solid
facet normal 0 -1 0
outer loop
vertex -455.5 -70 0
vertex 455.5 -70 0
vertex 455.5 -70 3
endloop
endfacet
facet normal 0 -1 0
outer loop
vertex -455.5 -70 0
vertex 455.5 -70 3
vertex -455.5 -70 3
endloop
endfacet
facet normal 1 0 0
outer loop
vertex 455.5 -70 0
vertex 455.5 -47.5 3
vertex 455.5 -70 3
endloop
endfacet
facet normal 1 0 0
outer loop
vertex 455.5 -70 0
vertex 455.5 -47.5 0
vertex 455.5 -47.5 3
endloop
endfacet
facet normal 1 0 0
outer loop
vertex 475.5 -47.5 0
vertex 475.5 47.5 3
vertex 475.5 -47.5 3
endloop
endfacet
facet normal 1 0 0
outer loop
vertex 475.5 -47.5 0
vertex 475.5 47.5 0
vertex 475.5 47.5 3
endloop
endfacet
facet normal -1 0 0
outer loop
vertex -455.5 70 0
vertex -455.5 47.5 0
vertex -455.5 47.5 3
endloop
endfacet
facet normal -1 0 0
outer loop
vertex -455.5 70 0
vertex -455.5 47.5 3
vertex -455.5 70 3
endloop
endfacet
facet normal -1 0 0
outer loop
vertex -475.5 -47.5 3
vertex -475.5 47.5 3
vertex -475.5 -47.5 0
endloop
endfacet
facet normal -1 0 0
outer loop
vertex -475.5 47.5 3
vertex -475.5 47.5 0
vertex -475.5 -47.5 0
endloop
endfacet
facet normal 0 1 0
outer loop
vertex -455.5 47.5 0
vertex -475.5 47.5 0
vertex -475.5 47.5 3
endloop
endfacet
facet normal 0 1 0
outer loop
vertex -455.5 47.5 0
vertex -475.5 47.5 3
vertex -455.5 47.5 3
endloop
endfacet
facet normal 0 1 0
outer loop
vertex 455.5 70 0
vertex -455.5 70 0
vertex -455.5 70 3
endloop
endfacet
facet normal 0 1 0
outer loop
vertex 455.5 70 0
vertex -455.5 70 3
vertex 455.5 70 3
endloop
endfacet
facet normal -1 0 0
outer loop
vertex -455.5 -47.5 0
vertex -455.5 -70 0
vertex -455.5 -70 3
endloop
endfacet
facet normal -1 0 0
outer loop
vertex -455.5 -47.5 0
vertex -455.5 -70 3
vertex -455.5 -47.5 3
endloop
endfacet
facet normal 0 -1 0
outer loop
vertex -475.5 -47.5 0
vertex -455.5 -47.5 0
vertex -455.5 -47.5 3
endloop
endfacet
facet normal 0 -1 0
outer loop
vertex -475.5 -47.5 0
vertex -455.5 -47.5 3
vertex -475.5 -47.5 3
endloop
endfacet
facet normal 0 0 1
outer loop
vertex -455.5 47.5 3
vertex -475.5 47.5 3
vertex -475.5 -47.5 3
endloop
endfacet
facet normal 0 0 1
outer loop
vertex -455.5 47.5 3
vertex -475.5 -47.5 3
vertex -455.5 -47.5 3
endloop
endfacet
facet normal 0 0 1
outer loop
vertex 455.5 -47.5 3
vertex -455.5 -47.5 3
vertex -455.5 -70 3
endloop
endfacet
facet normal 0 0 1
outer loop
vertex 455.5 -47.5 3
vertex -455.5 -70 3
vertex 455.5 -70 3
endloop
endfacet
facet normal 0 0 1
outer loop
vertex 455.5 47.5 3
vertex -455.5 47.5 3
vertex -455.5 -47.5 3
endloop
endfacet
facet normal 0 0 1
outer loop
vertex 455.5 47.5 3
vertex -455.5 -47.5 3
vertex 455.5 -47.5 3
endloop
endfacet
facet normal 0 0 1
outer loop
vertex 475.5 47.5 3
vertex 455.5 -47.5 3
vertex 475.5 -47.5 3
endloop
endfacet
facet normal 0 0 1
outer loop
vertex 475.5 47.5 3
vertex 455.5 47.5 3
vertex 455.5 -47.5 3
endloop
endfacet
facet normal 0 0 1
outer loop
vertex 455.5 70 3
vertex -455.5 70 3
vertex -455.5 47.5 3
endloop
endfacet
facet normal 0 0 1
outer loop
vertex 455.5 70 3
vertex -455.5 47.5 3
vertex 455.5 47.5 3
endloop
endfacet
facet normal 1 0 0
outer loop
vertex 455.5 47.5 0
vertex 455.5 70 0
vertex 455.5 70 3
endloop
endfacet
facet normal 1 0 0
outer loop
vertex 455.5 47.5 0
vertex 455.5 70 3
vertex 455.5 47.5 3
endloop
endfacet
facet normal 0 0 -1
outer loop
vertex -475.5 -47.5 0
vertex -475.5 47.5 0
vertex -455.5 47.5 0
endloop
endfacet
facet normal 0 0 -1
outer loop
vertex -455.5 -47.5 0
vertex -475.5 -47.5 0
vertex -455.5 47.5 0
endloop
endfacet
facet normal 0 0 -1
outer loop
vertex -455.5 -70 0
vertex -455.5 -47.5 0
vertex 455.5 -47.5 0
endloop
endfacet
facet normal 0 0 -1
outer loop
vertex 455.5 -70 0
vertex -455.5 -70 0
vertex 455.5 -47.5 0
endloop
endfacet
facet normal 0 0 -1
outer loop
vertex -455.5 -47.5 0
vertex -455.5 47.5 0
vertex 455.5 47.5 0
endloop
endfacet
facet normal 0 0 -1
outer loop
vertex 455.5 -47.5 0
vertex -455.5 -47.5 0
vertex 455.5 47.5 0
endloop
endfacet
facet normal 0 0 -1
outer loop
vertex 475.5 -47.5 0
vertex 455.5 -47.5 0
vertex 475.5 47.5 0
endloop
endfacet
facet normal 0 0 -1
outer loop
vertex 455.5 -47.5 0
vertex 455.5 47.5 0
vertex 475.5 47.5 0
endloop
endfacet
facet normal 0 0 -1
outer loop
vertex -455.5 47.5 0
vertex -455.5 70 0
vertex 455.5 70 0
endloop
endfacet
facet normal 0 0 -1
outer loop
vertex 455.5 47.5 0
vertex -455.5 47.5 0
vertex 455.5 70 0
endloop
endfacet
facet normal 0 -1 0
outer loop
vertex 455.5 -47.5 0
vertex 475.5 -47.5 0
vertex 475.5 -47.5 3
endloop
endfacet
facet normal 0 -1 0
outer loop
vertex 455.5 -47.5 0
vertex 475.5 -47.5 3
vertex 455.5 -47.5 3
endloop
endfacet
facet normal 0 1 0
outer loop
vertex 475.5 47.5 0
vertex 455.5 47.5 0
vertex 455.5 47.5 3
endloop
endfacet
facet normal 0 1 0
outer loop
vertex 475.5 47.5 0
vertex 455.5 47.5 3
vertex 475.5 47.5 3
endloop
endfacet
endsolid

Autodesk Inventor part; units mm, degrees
ref_plane "YZ Plane" through (0, 0, 0) normal (1, 0, 0) x (0, 1, 0)
ref_plane "XZ Plane" through (0, 0, 0) normal (0, 1, 0) x (-1, 0, 0)
ref_plane "XY Plane" through (0, 0, 0) normal (0, 0, 1) x (1, 0, 0)
sketch "草图1" plane through (0, 0, 0) normal (0, 0, 1) x (1, 0, 0)
  line L0 (477.5, -70) -> (-477.5, -70)
  line L1 (-477.5, -70) -> (-477.5, 70)
  line L2 (-477.5, 70) -> (477.5, 70)
  line L3 (477.5, 70) -> (477.5, -70)
  line L4 (477.5, -70) -> (-477.5, 70) construction
  line L5 (-477.5, -70) -> (477.5, 70) construction
  line L6 (477.5, -40) -> (-477.5, -40) projected
  line L7 (477.5, 40) -> (-477.5, 40) projected
  line L8 (-457.5, 40) -> (-457.5, -40)
  line L9 (457.5, 40) -> (457.5, -40) projected
  line L10 (-455.5, -70) -> (-455.5, 70)
  line L11 (-475.5, 69.7068) -> (-475.5, -70)
  line L12 (475.5, 70) -> (475.5, -70)
  line L13 (455.5, 70) -> (455.5, -70)
  line L14 (475.5, -47.5) -> (-475.5, -47.5)
  line L15 (-475.5, -47.5) -> (-475.5, 47.5)
  line L16 (-475.5, 47.5) -> (475.5, 47.5)
  line L17 (475.5, 47.5) -> (475.5, -47.5)
  line L18 (475.5, -47.5) -> (-475.5, 47.5) construction
  line L19 (-475.5, -47.5) -> (475.5, 47.5) construction
  point P0 (0, 0)
  point P1 (457.5, -70)
  point P2 (457.5, 70)
  point P3 (-455.5, 40)
  point P4 (-455.5, -40)
  point P5 (475.5, -64)
  point P6 (475.5, 64)
  point P7 (-475.5, 40)
  point P8 (-475.5, -40)
  point P9 (455.5, -40)
  point P10 (475.5, -40)
  point P11 (475.5, 40)
  point P12 (455.5, 40)
  point P13 (455.5, -47.5)
  point P14 (475.5, 47.5)
  point P15 (455.5, 47.5)
  point P16 (-475.5, -47.5)
  point P17 (-455.5, -47.5)
  point P18 (-455.5, 47.5)
  dimension "d0" = 140
  dimension "d1" = 955
  dimension "d6" = 2
  dimension "d7" = 2
  dimension "d8" = 2
  dimension "d9" = 2
  dimension "d12" = 95
extrude "拉伸1" add sketch "草图1" along normal blind 3 contours L0 L10 L14 L13 | L14 L13 L6 L12 | L6 L9 L7 L12 | L14 L10 L6 L13 | L7 L13 L16 L12 | L6 L13 L7 L9 | L14 L11 L6 L10 | L6 L10 L7 L13 | L6 L8 L7 L10 | L7 L10 L16 L13 | L13 L16 L10 L2 | L11 L7 L8 L6 | L7 L11 L16 L10
properties part number "内板"
